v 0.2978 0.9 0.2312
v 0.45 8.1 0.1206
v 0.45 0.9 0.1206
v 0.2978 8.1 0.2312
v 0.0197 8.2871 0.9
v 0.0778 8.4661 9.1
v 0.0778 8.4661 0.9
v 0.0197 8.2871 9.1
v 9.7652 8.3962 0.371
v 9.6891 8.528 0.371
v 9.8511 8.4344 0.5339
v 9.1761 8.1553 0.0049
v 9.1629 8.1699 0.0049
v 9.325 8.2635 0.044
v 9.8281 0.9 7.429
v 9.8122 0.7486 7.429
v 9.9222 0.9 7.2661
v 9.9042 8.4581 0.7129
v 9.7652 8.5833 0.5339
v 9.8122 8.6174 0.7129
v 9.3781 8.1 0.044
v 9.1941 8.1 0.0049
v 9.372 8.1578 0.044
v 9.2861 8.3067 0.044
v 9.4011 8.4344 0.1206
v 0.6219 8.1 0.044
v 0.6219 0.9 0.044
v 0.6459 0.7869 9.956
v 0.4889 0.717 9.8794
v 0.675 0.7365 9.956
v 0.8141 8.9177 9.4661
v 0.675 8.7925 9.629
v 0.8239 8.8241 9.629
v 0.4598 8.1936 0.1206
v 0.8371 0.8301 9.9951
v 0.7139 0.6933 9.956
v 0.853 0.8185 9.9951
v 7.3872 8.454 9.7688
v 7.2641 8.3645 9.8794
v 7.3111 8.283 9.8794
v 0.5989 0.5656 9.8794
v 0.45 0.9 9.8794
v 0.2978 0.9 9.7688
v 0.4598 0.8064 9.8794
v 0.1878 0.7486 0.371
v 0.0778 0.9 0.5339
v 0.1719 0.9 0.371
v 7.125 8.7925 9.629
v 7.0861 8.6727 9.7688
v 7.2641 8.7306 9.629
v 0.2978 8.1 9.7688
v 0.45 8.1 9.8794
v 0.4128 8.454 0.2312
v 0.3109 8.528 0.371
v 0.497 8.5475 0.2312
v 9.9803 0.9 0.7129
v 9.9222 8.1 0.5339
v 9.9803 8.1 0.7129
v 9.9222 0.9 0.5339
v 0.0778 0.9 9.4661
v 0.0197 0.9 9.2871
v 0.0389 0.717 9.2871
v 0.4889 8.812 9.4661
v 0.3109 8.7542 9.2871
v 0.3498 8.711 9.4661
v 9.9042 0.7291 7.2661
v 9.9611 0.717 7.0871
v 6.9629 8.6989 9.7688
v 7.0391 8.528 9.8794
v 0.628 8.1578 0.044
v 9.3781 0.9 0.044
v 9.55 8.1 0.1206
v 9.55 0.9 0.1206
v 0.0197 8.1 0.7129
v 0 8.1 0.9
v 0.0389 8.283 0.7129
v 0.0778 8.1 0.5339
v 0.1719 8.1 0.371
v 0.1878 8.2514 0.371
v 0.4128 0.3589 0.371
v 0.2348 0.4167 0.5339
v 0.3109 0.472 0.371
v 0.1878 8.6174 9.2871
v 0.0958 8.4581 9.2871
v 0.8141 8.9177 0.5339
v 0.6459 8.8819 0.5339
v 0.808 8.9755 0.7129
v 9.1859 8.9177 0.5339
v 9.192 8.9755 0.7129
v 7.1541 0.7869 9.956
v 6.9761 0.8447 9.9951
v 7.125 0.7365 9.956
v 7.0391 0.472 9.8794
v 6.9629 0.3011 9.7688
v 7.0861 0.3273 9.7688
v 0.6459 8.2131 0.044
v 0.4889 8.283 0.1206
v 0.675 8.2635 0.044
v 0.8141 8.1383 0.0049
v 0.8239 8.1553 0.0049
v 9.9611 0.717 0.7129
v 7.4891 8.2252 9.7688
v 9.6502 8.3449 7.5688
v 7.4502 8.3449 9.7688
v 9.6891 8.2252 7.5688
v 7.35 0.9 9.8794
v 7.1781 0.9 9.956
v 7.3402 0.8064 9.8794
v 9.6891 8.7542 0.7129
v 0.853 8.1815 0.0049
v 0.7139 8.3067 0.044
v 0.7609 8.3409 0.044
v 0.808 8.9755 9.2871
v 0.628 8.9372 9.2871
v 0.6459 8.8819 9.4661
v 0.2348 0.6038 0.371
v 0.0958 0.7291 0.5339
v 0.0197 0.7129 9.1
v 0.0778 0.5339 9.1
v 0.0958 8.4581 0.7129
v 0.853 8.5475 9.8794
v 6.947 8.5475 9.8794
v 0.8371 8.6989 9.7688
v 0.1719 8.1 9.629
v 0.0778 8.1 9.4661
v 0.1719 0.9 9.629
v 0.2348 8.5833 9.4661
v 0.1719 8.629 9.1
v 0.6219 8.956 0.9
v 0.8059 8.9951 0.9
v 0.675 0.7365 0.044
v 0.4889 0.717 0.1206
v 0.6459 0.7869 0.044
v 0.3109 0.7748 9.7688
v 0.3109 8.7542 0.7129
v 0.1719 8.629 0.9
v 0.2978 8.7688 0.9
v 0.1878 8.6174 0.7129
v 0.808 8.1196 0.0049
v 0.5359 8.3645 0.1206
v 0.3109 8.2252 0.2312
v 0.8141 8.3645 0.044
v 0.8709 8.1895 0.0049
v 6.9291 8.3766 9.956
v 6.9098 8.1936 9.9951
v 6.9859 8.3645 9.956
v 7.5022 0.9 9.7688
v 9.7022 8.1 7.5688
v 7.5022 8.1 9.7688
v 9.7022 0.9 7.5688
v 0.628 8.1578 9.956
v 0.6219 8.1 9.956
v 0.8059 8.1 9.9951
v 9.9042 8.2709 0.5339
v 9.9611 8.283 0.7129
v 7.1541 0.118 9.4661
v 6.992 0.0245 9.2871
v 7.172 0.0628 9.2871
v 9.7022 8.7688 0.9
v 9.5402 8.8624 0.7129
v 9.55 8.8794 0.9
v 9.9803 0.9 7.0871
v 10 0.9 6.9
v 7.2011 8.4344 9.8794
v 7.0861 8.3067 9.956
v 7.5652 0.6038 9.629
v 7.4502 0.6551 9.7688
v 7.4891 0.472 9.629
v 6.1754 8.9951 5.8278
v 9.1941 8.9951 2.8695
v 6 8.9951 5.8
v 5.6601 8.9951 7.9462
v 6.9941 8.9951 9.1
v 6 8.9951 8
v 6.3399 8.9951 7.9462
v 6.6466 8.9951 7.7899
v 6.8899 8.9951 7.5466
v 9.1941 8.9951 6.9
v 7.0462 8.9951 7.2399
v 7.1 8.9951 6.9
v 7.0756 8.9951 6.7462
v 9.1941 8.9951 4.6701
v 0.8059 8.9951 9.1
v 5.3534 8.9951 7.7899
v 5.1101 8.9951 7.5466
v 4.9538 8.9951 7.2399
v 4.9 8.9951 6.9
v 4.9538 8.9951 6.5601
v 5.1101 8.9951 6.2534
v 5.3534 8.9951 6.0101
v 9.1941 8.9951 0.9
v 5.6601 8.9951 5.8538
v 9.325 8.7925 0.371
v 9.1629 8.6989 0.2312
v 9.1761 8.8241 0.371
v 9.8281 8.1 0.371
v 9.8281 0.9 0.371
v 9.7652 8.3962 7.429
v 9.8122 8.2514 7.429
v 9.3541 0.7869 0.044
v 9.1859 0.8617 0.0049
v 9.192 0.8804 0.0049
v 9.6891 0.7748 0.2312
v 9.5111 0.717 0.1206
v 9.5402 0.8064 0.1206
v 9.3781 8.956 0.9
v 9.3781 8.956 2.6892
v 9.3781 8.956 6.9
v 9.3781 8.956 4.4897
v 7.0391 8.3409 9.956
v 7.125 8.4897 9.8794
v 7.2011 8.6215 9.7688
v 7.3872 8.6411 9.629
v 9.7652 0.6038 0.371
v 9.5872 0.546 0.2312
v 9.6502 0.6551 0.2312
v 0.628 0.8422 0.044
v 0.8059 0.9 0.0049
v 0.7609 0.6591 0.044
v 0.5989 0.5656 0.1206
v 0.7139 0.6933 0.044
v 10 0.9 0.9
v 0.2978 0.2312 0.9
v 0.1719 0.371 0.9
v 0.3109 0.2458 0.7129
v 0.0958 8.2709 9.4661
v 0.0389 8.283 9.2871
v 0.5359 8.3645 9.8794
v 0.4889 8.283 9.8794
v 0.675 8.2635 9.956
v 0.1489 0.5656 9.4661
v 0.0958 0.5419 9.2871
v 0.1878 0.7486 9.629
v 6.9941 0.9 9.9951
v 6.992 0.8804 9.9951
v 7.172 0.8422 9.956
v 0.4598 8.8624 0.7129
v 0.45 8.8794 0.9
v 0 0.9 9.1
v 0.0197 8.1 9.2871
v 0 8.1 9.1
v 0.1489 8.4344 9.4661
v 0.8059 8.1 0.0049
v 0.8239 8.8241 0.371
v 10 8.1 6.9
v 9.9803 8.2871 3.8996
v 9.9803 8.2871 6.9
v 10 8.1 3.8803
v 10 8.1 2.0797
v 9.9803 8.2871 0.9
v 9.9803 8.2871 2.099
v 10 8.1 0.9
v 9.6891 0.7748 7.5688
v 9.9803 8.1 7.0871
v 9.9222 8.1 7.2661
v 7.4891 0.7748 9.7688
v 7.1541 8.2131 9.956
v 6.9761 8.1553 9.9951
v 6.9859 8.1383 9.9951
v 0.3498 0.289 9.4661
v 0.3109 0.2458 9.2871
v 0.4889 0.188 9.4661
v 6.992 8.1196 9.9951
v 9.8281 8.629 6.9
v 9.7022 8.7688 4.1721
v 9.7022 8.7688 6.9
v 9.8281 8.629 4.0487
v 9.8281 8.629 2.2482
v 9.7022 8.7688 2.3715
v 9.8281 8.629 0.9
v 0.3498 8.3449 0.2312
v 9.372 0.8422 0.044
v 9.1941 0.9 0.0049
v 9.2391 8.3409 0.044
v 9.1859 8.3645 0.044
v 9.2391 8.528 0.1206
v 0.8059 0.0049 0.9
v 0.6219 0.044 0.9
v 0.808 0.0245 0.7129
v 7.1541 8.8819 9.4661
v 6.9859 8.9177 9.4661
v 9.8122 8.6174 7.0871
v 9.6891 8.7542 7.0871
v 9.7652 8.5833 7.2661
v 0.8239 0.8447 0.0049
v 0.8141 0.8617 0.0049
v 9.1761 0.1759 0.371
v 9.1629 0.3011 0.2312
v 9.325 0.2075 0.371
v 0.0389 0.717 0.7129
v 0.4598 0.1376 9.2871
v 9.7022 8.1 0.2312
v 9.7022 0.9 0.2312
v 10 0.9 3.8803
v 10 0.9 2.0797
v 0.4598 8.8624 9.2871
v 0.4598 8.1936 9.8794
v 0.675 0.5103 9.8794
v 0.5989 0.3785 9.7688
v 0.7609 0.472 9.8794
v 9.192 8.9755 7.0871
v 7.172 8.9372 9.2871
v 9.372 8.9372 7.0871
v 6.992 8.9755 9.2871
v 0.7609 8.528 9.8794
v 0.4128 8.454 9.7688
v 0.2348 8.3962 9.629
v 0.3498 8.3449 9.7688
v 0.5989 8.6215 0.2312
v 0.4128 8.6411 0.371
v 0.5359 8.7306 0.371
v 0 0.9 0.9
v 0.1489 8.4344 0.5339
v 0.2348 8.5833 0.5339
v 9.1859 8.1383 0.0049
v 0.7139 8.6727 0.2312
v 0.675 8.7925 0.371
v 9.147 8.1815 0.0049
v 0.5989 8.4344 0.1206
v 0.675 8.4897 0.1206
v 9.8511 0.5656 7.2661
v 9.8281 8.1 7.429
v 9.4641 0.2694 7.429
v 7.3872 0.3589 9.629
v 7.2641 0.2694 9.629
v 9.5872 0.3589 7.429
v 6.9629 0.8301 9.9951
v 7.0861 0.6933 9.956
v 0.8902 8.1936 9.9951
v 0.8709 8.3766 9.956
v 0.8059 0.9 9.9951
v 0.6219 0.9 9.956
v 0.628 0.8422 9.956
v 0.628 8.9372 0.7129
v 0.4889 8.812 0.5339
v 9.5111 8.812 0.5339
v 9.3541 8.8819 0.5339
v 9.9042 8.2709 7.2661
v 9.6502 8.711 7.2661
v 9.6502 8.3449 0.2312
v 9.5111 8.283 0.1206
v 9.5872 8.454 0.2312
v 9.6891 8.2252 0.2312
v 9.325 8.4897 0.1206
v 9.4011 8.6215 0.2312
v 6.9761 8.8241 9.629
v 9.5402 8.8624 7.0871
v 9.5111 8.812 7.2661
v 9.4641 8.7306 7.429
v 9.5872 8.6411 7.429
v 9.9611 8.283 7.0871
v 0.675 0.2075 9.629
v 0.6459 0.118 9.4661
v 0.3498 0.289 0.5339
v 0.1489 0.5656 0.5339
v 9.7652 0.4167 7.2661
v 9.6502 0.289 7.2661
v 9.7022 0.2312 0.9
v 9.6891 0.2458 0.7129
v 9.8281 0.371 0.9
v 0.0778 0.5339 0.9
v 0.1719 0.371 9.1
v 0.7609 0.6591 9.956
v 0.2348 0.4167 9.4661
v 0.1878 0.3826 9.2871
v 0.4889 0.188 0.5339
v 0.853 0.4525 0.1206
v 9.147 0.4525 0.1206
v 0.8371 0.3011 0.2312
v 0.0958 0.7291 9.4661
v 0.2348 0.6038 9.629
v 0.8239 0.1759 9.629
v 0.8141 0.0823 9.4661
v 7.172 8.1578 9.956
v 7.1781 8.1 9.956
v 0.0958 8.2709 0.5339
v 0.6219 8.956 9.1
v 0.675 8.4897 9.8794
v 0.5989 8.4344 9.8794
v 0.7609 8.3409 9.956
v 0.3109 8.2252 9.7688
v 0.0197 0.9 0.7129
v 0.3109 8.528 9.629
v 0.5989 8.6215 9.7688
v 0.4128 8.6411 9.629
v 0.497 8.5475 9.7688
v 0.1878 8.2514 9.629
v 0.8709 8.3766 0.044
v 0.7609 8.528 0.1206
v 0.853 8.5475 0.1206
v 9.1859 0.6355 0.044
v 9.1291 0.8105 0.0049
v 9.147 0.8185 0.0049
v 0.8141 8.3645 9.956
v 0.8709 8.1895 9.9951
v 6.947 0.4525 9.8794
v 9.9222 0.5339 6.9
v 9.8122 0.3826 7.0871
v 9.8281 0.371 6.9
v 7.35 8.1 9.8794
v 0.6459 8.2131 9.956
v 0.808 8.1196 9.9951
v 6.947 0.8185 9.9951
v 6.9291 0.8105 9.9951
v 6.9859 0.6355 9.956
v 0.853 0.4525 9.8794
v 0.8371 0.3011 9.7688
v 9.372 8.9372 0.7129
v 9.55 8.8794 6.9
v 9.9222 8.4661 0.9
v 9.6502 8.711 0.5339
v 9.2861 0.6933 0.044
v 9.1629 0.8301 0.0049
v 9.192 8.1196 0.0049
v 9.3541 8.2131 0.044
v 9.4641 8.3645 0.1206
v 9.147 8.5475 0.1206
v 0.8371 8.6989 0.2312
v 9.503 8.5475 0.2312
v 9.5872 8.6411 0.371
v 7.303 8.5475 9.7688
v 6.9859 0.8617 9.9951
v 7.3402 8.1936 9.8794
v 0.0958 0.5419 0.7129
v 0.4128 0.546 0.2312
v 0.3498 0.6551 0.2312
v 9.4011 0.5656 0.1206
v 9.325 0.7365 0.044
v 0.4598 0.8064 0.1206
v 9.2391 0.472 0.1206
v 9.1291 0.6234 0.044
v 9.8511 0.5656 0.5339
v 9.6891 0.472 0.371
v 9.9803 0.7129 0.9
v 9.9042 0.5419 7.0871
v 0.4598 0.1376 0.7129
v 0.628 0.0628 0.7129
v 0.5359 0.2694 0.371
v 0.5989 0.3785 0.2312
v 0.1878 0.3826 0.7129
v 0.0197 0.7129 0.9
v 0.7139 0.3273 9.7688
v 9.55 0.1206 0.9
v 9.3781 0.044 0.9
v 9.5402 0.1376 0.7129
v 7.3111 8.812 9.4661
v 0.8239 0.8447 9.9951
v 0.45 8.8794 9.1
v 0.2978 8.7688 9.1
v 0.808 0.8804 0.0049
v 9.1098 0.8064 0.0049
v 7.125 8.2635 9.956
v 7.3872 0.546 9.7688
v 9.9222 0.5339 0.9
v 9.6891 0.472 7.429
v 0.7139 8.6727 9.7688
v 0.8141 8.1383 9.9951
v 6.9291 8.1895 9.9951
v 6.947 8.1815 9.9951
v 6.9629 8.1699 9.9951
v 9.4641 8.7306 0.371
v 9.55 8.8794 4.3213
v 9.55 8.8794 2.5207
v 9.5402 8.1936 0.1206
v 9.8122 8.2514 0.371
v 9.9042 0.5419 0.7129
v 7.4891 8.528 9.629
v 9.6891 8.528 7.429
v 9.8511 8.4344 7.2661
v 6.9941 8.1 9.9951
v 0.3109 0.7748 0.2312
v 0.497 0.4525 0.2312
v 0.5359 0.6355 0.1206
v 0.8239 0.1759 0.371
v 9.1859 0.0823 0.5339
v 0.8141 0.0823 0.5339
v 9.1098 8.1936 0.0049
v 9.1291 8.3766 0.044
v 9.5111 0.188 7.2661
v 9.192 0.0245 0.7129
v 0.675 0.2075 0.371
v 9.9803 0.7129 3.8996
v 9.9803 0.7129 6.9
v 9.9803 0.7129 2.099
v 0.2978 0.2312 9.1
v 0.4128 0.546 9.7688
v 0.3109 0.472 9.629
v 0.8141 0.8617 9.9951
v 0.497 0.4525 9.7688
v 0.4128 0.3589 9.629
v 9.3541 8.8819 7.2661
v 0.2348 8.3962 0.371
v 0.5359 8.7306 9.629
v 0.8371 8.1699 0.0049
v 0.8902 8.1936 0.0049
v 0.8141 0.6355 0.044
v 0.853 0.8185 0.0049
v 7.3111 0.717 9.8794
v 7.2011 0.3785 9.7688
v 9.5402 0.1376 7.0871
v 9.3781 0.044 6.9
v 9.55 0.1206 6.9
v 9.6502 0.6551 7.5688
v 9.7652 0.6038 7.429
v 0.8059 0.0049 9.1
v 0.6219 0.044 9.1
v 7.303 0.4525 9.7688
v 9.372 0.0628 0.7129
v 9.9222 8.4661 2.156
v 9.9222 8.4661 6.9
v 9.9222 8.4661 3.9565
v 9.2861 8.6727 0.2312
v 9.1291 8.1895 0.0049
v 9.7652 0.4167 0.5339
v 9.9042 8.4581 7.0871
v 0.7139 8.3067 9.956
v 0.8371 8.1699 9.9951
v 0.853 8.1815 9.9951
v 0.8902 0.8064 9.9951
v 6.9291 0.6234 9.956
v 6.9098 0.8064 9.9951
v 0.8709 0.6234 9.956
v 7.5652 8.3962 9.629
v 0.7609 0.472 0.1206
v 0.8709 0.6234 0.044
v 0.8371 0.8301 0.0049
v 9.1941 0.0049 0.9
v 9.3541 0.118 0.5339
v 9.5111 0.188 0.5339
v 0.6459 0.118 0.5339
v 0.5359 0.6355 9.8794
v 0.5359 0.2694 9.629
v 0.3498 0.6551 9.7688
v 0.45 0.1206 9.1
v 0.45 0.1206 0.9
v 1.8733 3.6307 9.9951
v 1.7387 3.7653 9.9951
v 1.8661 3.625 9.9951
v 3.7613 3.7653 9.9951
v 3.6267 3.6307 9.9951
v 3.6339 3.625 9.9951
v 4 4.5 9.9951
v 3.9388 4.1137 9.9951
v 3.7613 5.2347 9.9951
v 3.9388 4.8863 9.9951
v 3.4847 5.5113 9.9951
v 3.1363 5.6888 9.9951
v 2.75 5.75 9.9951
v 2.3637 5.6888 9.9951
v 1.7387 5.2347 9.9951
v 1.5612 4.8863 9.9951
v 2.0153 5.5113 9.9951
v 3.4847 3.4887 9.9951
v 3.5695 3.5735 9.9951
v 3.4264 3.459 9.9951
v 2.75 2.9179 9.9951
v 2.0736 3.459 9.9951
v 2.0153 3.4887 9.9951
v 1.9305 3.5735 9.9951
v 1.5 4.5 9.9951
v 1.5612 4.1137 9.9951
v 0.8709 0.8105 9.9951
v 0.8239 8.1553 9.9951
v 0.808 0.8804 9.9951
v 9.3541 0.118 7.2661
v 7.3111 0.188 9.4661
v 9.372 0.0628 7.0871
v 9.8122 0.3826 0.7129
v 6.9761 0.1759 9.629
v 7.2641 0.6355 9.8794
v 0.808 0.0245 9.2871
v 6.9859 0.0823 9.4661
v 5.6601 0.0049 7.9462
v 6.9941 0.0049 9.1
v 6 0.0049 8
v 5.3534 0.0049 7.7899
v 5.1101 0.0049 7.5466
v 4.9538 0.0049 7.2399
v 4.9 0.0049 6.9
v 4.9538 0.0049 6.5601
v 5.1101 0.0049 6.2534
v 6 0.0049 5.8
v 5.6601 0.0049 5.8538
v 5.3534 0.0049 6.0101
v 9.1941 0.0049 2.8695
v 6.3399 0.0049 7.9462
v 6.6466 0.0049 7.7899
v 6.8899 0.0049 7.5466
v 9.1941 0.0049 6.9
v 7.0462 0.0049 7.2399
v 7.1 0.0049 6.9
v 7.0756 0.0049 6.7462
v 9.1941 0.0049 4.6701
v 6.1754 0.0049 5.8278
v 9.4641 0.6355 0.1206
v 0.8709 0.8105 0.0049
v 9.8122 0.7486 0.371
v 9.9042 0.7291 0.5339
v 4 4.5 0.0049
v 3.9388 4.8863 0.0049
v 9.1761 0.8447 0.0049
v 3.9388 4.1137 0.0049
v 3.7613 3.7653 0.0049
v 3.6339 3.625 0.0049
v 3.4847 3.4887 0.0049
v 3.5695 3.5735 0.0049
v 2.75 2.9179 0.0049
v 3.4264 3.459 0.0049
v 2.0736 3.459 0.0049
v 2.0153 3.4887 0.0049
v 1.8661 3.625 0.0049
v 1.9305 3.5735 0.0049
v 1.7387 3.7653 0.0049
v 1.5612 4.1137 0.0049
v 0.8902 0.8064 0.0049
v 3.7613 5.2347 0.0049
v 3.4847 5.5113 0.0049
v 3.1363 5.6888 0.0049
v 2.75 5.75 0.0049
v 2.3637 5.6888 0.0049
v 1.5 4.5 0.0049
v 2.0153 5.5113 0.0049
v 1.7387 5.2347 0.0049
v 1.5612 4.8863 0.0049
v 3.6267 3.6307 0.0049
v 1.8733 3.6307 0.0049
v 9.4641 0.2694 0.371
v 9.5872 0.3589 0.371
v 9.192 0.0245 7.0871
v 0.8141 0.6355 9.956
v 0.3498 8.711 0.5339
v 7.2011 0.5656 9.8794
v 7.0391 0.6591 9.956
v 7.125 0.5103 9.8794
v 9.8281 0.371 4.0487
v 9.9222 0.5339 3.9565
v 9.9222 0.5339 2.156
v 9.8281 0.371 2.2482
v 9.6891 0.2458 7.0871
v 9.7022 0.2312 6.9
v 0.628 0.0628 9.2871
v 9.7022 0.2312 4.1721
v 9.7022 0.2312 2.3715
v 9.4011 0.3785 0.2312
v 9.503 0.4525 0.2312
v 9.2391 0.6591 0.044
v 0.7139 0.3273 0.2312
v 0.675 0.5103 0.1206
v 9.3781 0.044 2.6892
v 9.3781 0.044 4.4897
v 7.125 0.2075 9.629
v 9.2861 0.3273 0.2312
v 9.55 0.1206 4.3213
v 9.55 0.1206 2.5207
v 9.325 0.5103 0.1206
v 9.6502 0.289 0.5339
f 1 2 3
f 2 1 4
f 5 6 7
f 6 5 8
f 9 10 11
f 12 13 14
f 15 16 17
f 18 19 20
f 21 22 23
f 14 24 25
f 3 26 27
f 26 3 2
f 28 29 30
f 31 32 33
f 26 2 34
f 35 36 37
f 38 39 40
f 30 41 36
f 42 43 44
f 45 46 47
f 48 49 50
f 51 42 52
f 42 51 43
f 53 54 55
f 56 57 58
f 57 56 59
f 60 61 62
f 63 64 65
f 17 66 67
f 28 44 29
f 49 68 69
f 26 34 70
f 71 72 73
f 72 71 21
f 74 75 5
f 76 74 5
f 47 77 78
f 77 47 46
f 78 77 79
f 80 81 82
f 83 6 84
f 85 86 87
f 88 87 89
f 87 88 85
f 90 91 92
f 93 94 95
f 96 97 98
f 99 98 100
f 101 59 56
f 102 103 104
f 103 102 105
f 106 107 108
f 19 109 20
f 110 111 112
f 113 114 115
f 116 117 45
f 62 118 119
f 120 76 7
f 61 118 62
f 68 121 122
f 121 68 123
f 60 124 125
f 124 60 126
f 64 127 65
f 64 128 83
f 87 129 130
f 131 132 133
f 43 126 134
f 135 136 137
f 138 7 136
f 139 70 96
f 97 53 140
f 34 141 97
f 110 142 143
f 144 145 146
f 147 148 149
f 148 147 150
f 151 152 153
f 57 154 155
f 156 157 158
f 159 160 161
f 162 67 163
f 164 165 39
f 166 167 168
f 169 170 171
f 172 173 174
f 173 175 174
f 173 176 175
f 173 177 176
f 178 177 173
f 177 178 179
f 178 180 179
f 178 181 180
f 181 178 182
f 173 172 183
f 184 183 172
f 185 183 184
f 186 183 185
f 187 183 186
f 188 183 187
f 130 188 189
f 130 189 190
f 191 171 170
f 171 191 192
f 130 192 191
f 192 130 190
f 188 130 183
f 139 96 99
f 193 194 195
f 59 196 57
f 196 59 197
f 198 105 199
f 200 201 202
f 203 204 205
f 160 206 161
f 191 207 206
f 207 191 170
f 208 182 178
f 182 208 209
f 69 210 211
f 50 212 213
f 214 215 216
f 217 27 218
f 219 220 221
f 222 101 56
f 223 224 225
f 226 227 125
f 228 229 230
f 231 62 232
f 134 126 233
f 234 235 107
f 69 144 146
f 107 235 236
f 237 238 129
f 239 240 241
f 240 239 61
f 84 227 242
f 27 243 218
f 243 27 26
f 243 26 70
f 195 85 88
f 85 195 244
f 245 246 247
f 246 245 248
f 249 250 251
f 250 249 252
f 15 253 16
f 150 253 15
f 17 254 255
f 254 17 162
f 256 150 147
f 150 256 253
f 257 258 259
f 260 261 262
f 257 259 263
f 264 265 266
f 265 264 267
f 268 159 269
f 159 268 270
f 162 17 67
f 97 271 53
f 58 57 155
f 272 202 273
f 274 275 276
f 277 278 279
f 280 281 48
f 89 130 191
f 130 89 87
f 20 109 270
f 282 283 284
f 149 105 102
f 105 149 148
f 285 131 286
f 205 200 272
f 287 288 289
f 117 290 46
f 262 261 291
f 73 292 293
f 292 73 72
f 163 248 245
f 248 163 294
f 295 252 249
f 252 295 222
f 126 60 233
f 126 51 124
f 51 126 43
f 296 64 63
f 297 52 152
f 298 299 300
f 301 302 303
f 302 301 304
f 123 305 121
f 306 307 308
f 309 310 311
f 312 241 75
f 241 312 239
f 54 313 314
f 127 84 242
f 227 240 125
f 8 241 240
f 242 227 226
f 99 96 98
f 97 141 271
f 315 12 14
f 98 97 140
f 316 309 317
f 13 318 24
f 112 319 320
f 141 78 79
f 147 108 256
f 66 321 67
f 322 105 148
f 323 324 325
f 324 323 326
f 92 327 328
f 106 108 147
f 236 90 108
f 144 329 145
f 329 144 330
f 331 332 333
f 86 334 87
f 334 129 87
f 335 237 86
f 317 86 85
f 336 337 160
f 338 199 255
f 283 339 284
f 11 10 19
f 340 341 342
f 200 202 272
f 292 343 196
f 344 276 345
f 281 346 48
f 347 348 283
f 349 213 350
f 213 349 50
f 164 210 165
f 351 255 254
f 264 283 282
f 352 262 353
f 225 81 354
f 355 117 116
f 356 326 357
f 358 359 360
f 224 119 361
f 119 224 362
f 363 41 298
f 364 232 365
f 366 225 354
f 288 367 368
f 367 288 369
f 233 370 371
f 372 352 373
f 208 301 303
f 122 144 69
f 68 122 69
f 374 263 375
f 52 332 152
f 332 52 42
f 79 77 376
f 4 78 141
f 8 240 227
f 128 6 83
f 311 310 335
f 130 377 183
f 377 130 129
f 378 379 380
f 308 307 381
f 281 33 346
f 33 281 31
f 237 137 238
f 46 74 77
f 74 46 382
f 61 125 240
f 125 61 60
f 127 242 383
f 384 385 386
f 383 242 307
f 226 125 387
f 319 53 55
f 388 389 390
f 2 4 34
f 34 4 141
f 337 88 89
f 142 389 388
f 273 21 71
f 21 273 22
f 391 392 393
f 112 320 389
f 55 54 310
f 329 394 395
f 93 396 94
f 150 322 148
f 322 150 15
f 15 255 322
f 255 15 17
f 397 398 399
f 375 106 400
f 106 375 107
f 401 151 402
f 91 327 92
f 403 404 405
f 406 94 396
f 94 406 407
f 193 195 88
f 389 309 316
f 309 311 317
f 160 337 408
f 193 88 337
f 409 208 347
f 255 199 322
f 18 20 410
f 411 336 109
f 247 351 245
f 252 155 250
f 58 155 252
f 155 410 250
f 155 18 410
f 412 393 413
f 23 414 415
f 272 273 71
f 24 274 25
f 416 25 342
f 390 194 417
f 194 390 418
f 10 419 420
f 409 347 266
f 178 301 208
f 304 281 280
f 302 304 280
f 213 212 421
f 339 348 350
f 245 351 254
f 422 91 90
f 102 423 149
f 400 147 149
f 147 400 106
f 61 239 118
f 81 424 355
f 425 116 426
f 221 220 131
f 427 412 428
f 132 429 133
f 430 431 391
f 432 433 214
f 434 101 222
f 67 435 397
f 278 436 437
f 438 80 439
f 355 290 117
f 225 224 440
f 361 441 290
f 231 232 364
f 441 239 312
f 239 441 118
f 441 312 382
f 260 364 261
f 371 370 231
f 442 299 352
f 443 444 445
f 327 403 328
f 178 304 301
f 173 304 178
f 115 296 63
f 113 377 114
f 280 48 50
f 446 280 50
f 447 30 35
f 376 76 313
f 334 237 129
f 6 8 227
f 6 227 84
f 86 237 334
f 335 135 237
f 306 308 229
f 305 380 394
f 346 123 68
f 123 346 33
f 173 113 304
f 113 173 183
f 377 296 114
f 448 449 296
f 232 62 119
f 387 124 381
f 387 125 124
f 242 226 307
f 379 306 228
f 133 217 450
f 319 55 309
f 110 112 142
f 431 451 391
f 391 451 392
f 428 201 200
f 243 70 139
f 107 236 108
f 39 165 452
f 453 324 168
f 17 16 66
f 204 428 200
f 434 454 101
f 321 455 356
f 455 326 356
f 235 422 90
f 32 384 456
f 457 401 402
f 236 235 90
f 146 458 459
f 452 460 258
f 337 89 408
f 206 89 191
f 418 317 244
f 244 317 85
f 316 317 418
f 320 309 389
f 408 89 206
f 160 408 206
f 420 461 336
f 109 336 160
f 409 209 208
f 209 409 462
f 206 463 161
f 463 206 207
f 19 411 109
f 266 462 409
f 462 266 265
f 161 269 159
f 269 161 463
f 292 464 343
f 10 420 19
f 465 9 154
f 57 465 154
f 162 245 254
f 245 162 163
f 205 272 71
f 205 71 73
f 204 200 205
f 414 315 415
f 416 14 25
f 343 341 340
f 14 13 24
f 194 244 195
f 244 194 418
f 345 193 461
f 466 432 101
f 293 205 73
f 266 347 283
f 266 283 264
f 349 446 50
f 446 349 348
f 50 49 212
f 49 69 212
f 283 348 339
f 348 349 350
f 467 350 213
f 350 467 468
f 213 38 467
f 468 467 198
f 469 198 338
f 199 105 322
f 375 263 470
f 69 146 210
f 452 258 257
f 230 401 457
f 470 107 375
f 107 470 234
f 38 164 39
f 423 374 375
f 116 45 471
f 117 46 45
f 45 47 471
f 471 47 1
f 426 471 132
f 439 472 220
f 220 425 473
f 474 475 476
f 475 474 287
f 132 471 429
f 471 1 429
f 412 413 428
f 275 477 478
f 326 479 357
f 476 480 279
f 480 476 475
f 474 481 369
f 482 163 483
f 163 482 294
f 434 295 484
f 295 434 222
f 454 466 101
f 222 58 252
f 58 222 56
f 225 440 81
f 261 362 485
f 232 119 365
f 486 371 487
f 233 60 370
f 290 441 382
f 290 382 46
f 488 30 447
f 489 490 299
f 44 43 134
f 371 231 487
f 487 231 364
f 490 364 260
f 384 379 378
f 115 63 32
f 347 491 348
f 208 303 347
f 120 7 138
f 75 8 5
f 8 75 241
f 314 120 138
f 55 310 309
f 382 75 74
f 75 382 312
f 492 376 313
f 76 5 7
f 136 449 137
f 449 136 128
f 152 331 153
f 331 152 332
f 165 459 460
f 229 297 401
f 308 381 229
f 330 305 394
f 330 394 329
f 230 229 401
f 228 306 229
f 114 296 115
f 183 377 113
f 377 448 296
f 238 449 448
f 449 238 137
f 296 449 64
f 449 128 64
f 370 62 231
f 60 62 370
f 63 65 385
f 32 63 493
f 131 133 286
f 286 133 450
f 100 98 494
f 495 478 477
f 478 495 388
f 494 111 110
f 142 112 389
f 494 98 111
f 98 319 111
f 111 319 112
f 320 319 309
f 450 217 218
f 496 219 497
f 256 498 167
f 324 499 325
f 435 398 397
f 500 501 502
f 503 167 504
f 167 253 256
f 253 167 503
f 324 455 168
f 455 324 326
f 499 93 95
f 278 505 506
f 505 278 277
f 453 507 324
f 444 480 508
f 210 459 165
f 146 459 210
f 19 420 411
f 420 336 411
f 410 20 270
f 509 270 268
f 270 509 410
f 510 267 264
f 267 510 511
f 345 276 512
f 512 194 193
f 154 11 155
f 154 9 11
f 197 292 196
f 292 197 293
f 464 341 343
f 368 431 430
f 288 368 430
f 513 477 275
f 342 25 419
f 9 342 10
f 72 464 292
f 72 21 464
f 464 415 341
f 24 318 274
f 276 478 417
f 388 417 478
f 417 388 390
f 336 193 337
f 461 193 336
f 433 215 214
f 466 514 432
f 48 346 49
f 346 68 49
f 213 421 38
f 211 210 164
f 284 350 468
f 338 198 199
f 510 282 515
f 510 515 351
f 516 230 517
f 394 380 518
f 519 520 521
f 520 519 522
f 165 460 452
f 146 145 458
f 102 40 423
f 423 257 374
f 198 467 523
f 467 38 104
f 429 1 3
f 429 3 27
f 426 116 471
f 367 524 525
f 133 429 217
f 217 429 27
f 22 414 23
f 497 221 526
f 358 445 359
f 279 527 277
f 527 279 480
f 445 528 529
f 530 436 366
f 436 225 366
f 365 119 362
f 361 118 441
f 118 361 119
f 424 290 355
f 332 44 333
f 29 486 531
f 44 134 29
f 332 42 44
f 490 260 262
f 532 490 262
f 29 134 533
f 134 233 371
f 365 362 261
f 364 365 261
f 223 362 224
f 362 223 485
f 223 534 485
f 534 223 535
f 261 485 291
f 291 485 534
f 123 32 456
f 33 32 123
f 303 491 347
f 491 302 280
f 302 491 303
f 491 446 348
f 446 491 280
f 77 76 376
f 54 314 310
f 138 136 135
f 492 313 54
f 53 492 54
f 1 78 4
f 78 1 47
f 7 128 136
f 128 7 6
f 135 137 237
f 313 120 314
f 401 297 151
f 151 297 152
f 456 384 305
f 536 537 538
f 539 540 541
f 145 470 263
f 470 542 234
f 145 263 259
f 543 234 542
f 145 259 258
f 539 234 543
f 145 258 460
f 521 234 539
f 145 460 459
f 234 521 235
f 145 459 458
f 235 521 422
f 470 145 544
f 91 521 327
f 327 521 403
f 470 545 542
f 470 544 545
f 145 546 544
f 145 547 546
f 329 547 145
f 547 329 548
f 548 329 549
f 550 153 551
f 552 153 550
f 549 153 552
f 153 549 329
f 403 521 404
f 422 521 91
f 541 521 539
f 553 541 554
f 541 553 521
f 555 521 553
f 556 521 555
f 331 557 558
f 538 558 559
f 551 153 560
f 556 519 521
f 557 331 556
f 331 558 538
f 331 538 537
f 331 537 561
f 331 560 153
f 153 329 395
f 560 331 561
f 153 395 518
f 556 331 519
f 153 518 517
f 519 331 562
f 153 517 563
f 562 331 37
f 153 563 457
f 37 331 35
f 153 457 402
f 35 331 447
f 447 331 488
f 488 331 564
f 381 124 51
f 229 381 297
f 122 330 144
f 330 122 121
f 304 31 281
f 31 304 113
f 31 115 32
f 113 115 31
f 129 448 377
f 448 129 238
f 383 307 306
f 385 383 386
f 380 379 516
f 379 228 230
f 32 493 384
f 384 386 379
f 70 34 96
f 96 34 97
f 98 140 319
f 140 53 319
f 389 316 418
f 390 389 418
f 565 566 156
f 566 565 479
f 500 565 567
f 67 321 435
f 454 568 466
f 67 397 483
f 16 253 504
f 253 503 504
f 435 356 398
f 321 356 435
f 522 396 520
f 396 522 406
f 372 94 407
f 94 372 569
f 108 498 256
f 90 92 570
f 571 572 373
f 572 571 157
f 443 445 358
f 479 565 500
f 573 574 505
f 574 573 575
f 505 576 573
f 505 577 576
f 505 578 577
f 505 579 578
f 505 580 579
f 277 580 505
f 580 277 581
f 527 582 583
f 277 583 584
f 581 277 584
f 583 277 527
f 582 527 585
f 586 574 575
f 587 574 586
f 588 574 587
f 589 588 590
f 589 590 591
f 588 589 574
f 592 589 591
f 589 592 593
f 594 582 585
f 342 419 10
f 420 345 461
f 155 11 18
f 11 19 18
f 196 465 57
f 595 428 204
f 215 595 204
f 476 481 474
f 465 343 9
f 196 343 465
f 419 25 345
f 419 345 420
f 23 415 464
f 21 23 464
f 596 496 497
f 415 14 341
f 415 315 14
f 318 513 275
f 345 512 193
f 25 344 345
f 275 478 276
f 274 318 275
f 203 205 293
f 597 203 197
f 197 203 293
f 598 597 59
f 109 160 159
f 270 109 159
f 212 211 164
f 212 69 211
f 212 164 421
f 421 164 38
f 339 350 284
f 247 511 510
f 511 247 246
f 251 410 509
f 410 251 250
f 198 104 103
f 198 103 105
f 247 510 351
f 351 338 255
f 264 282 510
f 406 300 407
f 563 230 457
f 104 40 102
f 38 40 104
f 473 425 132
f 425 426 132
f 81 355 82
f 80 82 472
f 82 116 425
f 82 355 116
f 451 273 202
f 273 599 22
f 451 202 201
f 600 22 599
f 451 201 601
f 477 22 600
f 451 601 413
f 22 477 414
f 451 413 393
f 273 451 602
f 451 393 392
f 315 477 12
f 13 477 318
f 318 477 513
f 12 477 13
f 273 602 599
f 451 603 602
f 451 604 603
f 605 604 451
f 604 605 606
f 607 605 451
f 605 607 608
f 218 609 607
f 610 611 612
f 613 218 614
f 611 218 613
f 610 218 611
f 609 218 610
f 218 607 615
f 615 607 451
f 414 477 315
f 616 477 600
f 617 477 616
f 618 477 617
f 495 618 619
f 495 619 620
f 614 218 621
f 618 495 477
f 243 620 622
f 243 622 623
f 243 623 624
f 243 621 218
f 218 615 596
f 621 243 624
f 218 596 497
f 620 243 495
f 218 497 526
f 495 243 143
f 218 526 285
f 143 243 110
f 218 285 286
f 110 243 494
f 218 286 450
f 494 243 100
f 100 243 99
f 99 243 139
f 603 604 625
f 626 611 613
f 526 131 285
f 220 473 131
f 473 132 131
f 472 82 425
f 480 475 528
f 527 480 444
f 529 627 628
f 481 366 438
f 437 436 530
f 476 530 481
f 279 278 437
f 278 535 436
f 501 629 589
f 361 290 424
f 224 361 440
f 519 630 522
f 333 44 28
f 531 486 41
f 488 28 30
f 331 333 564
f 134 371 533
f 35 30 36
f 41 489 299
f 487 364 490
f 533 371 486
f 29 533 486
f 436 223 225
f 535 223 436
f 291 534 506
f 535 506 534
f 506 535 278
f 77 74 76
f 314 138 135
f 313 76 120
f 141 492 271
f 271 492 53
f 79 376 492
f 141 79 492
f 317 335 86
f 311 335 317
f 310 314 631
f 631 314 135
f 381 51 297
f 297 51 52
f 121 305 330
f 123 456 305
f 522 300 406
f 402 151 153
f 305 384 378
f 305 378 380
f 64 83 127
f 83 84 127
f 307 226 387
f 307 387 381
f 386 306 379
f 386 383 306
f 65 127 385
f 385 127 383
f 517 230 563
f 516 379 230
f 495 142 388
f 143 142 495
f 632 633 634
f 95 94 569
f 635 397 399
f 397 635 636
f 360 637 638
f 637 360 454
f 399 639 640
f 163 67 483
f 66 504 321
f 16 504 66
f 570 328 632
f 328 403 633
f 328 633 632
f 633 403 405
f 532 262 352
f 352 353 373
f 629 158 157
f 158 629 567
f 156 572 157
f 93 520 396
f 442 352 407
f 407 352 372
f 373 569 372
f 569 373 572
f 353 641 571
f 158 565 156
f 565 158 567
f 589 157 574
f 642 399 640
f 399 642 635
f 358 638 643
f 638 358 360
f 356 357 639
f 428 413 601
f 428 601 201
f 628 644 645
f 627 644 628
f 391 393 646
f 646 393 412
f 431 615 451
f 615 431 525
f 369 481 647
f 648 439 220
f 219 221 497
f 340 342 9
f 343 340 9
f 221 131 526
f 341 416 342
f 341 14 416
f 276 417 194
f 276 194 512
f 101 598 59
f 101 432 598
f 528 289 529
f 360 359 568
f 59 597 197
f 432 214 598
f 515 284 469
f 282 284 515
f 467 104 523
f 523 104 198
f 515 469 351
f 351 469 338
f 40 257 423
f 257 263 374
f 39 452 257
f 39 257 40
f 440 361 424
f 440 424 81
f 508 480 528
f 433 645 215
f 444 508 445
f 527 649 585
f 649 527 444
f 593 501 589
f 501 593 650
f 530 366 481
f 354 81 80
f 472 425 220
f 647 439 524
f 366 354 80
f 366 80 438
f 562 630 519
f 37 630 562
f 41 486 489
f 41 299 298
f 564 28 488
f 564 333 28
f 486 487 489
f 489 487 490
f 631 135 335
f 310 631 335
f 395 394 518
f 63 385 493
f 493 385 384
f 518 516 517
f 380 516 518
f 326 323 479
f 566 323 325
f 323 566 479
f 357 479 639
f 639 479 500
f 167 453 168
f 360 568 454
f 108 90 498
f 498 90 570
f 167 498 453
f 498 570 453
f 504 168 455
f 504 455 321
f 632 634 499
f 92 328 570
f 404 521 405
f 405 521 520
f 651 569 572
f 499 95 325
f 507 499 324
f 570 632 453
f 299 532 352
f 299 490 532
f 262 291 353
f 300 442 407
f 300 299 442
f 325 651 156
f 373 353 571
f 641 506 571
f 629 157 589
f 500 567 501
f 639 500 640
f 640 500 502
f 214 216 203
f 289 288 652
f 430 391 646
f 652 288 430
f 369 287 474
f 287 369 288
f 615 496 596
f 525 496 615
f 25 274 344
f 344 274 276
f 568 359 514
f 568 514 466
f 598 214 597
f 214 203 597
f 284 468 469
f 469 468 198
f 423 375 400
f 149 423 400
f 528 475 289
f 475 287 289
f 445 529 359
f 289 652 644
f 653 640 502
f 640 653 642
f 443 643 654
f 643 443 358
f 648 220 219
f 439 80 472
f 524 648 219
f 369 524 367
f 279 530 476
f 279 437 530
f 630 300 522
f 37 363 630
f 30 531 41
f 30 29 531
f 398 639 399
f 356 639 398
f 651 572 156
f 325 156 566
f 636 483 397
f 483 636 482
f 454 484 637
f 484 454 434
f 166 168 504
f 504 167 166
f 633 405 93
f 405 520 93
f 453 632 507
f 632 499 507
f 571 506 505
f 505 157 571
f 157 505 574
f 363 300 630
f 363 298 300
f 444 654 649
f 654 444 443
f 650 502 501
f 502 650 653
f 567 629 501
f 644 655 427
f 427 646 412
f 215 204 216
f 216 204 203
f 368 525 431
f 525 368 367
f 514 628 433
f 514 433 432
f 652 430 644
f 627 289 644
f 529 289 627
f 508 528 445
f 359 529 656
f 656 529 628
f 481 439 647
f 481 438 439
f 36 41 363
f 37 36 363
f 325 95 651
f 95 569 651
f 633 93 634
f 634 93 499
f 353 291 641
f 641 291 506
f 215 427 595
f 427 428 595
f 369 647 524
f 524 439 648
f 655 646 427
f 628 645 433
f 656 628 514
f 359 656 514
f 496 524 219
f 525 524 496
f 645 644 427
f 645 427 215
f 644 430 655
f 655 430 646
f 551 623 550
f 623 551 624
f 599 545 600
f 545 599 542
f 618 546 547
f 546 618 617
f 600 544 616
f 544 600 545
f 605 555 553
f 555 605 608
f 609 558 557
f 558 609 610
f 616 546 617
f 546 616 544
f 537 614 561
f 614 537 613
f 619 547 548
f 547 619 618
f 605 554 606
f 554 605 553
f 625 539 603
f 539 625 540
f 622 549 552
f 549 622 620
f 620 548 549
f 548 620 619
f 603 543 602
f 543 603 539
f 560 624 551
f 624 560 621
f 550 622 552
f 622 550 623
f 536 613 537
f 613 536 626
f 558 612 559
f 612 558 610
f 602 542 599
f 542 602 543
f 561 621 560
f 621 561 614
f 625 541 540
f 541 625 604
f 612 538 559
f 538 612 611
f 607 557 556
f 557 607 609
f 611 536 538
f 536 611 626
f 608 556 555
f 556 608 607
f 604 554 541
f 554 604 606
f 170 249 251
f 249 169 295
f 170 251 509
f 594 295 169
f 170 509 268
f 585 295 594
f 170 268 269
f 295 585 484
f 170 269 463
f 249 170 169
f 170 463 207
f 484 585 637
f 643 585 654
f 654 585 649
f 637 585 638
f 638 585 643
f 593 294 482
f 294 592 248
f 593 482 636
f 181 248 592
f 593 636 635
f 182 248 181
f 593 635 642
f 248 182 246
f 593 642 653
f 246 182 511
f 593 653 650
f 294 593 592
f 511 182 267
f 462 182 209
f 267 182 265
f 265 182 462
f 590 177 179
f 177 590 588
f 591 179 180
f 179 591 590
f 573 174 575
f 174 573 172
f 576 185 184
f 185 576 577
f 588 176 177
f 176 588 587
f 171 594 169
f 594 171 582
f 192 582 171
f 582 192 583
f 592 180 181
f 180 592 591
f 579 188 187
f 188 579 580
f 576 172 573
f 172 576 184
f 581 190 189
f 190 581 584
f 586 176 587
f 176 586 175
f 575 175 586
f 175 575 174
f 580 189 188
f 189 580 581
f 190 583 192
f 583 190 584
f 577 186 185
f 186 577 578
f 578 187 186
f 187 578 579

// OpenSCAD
//***********************************
//     Lipo Battery Holder for Diatone 250 FPV    *
//          Henning Stöcklein 25.10.2015            *
//          Free for Non-commercial Use             *
//***********************************

// Base Block Size X
cx = 10 ; // [7:15] 

// Base Block Size Y
cy = 9 ; // [7:15]

// Base Block Height
ch = 10 ; // [7:15]

// Type of Block Chamfer
chamfer_type = 2 ; // [0:None, 1:2D-Chamfer, 2:3D-Chamfer]

//  Block Chamfer Radius
rCham = 0.9 ;

// Block Ramp Cutout (only 3D chamfer)
ramp = 2.2 ; 

// M3 Thread Core Diameter
rM3 = 2.5 ;

// Ruber Slot Position X
slot_x = -0.5 ;

// Ruber Slot Position Z
slot_z = 0.4 ;

// Rubber Slot Width
rRub1 = 0.65 ; 

// Rubber Slot End Hole Diameter
rRub2 = 2.2 ;

//*********  End of Customizing Area******************

module roundcube (x, y, z, rad)
{
    hull() {
      translate ([rad,rad,0]) cylinder (r=rad,h=z, $fn=30) ;
      translate ([rad, y-rad, 0]) cylinder (r=rad,h=z, $fn=30) ;
      translate ([x-rad, rad, 0]) cylinder (r=rad,h=z, $fn=30) ;
      translate ([x-rad, y-rad, 0]) cylinder (r=rad,h=z, $fn=30) ;
    }
}

module ballcube (x, y, z, rad)
{
    hull() {
      translate ([rad,rad,rad]) sphere (r=rad, $fn=30) ;
      translate ([rad, y-rad, rad]) sphere (r=rad, $fn=30) ;
      translate ([x-rad, rad, rad]) sphere (r=rad, $fn=30) ;
      translate ([x-rad, y-rad, rad]) sphere (r=rad, $fn=30) ;

      translate ([rad,rad,z-rad]) sphere (r=rad, $fn=30) ;
      translate ([rad, y-rad, z-rad]) sphere (r=rad, $fn=30) ;
      translate ([x-rad-ramp, rad, z-rad]) sphere (r=rad, $fn=30) ;
      translate ([x-rad-ramp, y-rad, z-rad]) sphere (r=rad, $fn=30) ;
      translate ([x-rad, rad, z-rad-ramp]) sphere (r=rad, $fn=30) ;
      translate ([x-rad, y-rad, z-rad-ramp]) sphere (r=rad, $fn=30) ;
    }
}

module holder ()
{
    difference () 
    {
       // Basic Cube with 2D or 3D chamfers
       if (chamfer_type == 0) { cube ([cx, cy, ch]) ; }
       if (chamfer_type == 1) { roundcube (cx, cy, ch, rCham) ; }
       if (chamfer_type == 2) { ballcube (cx, cy, ch, rCham) ; }

        // M3 Screw hole and hole extension for support-free printing
        translate ([1.5+rM3/2,cy/2,0]) cylinder (r=rM3/2, h=50, $fn=20) ;
        translate ([1.5+rM3/2,cy/2-rM3/2*0.7,0]) 
               scale ([1,0.8,1]) rotate ([0,0,45]) cube ([rM3/2,rM3/2,50], center=true ) ;
 
        // Slot for Rubber
        translate ([cx*0.65,cy,ch*0.65]) 
            hull() {
              translate ([slot_x,0,slot_z]) rotate ([90,0,0]) cylinder (r=rRub1, h=cy, $fn=20) ;
              translate ([4.5,0,-4.5]) rotate ([90,0,0]) cylinder (r=rRub1, h=cy, $fn=20) ;
           } // hull
           
        // Hole at end of Rubber slot
        translate ([cx*0.65+slot_x,cy,ch*0.65+slot_z]) rotate ([90,0,0]) cylinder (r=rRub2/2, h=cy, $fn=20) ;
    }
}

holder() ;
